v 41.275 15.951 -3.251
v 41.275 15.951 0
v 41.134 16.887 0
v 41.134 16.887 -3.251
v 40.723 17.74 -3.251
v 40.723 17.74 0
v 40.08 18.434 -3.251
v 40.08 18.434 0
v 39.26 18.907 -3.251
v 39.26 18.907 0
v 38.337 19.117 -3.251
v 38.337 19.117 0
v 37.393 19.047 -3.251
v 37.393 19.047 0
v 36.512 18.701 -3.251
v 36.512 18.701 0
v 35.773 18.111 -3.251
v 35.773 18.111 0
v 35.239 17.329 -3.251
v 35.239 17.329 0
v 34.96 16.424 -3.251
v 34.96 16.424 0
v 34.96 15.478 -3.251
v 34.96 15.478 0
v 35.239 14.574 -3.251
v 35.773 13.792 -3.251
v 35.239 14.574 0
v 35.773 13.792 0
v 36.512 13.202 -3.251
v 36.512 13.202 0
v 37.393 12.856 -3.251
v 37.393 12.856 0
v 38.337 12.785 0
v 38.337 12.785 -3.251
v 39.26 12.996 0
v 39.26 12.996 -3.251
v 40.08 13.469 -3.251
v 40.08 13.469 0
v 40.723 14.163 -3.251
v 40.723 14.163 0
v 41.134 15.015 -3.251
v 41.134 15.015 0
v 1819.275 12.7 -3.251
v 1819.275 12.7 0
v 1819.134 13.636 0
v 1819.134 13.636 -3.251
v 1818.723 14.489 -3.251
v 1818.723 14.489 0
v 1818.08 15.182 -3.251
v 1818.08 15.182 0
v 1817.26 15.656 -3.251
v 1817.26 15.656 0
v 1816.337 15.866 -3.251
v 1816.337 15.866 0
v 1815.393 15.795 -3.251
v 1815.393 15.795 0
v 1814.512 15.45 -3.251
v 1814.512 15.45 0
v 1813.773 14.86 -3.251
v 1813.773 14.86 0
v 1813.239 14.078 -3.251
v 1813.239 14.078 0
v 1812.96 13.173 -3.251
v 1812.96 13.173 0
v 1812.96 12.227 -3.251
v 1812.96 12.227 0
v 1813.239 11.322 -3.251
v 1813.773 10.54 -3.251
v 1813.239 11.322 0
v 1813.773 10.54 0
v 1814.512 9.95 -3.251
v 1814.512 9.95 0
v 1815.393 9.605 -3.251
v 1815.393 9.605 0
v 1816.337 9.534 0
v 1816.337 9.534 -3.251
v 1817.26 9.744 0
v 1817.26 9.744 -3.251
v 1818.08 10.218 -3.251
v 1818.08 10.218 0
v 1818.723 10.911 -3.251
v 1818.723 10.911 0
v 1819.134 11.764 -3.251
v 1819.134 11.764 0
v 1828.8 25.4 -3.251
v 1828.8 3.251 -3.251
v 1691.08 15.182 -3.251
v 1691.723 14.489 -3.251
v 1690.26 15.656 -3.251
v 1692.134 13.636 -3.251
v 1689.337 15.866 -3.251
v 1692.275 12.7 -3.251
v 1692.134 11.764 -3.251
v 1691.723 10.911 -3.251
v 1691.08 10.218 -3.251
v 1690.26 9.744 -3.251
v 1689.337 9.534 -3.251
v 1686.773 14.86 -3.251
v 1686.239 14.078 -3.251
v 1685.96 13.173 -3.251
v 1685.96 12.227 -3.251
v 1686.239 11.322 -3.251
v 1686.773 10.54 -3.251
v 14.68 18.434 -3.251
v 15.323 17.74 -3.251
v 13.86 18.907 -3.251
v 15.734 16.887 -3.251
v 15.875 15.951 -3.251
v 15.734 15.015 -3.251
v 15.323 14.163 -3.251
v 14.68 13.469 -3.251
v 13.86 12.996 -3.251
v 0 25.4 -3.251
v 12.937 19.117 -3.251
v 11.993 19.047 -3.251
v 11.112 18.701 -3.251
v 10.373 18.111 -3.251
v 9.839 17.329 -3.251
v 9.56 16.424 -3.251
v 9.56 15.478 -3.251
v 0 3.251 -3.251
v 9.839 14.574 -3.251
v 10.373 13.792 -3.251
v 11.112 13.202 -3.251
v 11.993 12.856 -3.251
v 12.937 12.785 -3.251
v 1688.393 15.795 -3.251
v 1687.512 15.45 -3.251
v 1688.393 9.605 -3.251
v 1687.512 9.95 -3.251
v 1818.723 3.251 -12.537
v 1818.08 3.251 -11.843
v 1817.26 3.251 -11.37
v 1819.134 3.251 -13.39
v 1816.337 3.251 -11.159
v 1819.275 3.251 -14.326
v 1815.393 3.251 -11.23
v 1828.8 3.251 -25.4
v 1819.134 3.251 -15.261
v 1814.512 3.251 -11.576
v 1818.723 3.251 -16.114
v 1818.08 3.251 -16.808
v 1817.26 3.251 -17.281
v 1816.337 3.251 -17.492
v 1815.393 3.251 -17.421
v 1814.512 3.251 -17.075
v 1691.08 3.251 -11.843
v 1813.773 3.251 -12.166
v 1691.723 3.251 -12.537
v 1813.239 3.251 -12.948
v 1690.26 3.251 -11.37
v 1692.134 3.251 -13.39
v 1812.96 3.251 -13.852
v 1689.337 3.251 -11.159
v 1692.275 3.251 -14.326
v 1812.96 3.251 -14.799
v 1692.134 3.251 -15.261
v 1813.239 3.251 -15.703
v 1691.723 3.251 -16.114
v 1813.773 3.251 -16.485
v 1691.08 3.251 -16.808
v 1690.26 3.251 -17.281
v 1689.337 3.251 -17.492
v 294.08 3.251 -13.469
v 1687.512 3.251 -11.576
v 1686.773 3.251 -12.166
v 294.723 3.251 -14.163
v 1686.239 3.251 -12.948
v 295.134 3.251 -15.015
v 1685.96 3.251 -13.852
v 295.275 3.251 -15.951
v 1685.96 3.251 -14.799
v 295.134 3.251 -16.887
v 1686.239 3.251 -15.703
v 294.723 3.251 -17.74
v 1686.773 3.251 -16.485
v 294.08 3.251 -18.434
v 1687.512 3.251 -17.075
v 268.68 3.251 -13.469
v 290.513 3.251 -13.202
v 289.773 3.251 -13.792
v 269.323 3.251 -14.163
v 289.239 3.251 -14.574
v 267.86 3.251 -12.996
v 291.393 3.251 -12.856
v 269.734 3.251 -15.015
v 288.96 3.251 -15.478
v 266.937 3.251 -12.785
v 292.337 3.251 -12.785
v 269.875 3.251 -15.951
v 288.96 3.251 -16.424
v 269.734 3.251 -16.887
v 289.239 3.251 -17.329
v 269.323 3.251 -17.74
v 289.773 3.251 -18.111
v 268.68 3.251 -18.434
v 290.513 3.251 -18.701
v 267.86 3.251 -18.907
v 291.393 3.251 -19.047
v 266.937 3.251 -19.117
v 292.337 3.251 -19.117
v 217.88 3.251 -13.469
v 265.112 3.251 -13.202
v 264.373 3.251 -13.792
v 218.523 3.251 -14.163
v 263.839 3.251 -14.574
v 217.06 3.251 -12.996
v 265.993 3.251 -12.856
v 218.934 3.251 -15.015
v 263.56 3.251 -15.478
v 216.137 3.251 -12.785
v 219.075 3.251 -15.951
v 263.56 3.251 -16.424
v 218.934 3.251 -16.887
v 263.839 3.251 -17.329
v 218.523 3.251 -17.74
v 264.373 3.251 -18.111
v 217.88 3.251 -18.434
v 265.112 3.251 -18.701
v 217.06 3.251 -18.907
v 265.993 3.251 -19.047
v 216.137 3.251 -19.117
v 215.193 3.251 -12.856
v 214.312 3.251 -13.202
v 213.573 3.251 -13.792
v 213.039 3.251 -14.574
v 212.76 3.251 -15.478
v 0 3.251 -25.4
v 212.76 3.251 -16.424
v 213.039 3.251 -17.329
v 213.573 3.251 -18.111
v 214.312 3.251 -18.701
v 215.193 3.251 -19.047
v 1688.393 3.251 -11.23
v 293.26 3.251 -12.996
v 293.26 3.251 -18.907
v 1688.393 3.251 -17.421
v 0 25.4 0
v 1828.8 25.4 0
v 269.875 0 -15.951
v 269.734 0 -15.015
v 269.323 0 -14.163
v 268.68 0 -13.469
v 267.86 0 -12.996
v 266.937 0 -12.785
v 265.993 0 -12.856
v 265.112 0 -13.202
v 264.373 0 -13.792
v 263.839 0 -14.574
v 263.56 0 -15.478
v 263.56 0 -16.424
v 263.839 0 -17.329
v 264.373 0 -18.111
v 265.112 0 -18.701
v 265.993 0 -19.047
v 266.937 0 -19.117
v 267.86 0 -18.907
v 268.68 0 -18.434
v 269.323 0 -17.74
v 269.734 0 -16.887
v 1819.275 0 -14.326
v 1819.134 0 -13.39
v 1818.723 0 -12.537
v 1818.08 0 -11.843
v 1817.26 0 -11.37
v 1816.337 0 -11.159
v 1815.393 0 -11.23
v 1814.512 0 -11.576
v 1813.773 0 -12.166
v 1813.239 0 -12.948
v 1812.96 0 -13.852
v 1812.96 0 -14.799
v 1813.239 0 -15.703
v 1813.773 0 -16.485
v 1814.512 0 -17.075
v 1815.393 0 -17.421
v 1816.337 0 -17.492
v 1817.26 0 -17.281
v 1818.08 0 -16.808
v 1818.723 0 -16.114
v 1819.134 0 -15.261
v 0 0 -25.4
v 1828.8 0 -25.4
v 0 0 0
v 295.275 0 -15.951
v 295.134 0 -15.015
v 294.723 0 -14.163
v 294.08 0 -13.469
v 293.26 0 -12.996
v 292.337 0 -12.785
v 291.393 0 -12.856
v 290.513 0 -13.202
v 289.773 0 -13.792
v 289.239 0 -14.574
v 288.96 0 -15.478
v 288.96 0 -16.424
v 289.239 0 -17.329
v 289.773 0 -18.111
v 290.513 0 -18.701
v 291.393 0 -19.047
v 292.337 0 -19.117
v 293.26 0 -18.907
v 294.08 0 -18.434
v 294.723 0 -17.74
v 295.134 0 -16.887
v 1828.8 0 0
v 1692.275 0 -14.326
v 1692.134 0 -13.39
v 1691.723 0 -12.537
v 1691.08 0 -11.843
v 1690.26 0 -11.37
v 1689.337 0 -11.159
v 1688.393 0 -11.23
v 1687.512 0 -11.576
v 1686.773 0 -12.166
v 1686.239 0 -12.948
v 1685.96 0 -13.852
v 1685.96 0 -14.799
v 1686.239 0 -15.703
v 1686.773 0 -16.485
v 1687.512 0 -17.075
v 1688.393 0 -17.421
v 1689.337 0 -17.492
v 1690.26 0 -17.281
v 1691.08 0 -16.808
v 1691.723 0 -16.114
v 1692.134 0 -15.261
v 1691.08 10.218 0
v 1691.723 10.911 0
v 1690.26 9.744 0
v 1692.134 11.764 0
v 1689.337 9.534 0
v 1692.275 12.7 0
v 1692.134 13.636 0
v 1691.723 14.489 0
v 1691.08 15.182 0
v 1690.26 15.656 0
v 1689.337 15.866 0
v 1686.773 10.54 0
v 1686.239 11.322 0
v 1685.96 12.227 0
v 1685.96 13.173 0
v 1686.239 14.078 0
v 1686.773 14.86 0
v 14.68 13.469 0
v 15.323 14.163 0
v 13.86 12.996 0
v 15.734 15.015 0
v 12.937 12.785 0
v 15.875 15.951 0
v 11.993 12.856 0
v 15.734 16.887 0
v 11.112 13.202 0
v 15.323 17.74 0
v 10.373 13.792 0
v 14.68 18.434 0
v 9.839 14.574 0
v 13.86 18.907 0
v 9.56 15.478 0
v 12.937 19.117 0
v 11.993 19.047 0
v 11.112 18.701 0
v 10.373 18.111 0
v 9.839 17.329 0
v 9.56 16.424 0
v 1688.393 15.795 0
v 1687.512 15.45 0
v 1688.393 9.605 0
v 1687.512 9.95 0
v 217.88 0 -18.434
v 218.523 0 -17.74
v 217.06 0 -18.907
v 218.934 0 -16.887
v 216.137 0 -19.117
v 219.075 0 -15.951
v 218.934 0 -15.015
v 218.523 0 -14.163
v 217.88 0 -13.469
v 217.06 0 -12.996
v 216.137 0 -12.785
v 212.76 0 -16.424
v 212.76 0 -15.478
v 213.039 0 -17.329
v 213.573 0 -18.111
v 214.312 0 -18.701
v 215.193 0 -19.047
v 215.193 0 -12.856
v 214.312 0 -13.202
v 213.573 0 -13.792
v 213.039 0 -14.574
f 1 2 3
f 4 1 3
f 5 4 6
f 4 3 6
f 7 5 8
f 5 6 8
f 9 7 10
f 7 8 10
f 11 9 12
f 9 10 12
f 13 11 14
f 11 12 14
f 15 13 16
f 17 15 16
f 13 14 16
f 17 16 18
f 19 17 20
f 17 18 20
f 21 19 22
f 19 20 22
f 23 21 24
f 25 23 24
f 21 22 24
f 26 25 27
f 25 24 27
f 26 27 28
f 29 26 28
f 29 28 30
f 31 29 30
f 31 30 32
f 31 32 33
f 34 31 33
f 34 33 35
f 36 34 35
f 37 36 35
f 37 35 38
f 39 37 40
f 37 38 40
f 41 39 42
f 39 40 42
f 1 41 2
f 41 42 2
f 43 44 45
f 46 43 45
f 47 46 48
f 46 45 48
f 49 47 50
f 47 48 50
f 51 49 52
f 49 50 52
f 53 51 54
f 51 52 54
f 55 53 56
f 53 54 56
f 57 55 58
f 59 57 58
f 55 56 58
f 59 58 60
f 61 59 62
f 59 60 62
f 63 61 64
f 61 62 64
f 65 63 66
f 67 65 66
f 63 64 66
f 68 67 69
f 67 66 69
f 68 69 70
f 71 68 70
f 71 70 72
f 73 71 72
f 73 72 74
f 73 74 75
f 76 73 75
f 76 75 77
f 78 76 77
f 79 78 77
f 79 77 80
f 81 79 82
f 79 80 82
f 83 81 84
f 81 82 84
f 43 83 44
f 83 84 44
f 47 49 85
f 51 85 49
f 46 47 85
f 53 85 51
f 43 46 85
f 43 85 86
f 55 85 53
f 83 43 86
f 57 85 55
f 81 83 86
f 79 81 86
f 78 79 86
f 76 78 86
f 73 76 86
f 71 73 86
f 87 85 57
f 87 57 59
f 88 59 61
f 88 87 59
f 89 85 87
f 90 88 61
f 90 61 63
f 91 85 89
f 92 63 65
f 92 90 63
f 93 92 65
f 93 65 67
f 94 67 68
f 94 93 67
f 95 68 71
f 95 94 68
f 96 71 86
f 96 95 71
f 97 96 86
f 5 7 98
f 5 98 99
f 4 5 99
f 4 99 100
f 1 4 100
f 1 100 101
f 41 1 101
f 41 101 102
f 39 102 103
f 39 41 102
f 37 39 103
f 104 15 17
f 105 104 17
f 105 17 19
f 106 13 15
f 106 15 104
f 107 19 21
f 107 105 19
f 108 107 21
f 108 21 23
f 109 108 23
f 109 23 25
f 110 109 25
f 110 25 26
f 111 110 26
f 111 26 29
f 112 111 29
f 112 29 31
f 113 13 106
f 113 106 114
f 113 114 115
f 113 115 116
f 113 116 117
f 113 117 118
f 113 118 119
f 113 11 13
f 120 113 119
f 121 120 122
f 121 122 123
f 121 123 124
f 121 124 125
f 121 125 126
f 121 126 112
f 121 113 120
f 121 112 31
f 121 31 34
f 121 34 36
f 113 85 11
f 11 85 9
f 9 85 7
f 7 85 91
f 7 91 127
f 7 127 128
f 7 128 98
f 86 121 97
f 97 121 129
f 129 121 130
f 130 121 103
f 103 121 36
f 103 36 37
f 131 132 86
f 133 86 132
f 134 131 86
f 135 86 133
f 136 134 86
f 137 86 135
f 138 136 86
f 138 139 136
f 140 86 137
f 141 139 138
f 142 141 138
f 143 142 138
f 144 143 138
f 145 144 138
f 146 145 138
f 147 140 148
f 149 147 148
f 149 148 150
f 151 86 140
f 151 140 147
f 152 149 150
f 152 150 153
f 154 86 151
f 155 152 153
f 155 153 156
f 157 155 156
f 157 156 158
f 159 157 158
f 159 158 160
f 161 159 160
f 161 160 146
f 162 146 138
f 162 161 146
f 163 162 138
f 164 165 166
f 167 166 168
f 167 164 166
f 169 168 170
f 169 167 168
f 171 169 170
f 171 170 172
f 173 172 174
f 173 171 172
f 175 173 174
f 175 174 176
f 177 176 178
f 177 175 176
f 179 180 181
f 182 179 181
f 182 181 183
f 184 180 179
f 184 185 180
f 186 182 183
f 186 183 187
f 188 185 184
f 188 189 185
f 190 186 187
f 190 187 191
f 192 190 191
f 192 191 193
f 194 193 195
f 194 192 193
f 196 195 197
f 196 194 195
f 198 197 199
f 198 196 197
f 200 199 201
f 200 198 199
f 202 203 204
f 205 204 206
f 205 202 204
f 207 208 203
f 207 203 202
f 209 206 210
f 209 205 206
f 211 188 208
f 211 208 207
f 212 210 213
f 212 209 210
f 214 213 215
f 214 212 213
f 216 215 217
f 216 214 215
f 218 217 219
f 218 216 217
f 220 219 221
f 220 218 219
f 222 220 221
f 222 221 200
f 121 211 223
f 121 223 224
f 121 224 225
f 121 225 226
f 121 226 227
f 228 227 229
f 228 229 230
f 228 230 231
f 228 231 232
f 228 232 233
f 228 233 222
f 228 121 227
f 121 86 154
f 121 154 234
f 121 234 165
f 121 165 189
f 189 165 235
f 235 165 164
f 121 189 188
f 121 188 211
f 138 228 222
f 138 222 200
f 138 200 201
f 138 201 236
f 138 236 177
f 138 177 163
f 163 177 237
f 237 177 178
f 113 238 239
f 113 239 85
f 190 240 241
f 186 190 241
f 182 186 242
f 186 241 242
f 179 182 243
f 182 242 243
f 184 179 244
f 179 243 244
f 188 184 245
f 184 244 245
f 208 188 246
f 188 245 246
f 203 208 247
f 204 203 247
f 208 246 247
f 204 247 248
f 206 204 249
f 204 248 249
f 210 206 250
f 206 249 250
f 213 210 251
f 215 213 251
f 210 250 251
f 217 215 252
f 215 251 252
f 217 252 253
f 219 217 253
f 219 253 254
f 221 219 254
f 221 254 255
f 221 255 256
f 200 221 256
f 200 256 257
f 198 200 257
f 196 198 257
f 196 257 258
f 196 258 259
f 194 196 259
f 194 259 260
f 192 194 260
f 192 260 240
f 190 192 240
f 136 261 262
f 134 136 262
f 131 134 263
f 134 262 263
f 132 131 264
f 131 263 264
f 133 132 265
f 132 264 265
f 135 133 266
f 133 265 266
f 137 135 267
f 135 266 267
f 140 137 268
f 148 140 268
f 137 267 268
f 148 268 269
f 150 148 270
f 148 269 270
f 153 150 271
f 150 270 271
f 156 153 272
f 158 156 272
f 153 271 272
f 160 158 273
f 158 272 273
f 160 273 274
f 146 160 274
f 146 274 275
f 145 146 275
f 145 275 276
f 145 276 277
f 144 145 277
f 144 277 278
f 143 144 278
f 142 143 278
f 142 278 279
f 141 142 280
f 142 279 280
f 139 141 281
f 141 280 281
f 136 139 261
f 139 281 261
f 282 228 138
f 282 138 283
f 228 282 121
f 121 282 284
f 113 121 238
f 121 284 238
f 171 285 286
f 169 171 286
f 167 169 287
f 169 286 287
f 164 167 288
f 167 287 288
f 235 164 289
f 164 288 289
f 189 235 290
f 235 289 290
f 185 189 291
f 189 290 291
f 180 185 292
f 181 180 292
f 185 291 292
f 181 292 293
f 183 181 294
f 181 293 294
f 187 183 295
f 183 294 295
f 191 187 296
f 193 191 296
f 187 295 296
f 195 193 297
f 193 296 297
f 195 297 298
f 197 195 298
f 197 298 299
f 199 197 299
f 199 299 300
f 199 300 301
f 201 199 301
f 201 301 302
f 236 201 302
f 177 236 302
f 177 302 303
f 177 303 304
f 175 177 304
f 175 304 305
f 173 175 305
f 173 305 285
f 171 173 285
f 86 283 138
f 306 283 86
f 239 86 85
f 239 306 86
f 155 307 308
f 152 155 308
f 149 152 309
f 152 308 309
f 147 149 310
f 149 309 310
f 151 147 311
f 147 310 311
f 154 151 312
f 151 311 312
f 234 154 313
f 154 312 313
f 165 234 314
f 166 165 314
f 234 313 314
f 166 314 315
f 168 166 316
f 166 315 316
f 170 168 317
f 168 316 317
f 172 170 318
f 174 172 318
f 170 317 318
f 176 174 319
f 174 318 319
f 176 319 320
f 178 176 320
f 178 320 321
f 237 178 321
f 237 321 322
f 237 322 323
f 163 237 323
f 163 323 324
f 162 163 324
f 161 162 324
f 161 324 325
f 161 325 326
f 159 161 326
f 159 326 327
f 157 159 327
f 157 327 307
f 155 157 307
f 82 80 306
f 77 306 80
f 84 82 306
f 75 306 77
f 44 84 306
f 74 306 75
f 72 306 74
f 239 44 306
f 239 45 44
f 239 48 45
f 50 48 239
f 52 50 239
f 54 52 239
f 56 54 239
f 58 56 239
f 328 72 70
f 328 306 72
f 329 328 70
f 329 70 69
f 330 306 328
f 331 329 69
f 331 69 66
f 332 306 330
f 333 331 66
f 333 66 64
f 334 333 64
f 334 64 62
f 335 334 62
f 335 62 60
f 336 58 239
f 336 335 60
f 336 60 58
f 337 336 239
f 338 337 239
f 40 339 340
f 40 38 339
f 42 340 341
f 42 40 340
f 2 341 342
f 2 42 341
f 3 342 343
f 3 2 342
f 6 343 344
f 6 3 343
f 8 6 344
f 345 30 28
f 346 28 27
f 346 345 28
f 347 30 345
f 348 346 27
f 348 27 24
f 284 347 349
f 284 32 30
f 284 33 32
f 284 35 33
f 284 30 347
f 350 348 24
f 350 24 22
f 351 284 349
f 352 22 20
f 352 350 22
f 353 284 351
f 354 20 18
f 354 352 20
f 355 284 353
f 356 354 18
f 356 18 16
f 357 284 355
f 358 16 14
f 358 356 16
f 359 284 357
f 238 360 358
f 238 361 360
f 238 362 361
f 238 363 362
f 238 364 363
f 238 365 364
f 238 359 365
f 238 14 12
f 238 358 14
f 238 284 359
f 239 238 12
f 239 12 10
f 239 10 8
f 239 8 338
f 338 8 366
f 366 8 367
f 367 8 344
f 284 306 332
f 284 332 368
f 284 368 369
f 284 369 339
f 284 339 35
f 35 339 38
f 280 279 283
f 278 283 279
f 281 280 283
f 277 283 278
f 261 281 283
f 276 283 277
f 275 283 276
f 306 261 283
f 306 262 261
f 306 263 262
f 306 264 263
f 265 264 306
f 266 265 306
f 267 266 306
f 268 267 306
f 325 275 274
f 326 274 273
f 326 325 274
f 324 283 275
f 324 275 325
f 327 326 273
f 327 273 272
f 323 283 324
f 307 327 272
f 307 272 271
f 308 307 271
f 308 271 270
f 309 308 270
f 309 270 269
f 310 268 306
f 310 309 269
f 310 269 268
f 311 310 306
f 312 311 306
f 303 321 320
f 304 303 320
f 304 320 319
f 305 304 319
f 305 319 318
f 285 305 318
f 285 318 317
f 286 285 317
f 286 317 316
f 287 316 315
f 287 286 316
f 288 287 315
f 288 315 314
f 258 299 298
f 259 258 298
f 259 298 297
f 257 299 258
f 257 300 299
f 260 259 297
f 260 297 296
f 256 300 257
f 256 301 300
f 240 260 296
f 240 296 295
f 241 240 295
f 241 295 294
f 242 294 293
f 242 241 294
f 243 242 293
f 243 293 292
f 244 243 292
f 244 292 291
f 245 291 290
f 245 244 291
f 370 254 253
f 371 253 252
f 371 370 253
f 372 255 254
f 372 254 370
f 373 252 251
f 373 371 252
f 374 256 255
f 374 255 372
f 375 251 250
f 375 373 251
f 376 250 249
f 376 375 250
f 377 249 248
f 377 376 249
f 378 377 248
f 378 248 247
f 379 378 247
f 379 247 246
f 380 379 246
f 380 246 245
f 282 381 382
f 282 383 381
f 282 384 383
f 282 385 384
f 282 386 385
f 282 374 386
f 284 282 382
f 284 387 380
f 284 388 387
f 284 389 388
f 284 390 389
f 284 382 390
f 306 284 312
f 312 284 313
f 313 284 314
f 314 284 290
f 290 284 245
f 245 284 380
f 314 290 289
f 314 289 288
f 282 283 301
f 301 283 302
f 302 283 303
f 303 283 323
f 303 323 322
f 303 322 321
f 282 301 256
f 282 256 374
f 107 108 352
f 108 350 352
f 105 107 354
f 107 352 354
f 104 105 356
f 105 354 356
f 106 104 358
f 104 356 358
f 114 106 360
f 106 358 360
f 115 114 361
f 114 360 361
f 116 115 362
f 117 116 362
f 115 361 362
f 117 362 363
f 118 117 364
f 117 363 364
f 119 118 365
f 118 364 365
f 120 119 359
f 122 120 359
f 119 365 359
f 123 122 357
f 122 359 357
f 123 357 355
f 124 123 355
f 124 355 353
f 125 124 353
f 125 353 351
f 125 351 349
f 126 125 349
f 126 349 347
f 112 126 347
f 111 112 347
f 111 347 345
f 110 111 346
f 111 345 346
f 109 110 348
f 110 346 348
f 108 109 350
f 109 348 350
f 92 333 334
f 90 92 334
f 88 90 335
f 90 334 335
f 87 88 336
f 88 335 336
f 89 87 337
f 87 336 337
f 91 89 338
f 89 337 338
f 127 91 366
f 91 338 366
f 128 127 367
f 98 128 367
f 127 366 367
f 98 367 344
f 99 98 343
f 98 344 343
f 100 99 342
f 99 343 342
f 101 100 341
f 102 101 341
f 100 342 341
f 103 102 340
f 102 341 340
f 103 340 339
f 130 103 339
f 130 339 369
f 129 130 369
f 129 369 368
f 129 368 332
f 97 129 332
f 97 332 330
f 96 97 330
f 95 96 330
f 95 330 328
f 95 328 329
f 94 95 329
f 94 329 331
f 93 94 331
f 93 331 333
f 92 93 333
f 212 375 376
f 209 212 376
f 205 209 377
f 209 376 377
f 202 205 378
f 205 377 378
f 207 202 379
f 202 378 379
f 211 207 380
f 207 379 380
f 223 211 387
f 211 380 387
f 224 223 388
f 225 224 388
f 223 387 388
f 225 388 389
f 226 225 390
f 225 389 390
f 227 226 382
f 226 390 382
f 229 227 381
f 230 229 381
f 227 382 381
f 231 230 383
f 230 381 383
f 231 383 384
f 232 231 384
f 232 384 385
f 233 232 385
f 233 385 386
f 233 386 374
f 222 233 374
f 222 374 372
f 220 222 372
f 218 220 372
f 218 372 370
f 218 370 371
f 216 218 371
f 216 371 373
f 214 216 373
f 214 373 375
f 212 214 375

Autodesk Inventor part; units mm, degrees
ref_plane "YZ Plane" through (0, 0, 0) normal (1, 0, 0) x (0, 1, 0)
ref_plane "XZ Plane" through (0, 0, 0) normal (0, 1, 0) x (-1, 0, 0)
ref_plane "XY Plane" through (0, 0, 0) normal (0, 0, 1) x (1, 0, 0)
sketch "Sketch1" plane through (0, 0, 0) normal (1, 0, 0) x (0, 1, 0)
  line L0 (0, 0) -> (25.4, 0)
  line L1 (25.4, 0) -> (25.4, -3.2512)
  line L2 (3.2512, -25.4) -> (0, -25.4)
  line L3 (0, -25.4) -> (0, 0)
  line L4 (25.4, -3.2512) -> (3.2512, -3.2512)
  line L5 (3.2512, -3.2512) -> (3.2512, -25.4)
  dimension "d2" = 3.2512
  dimension "d3" = 3.2512
  dimension "d4" = 25.4
extrude "Extrusion1" add sketch "Sketch1" along normal blind 1828.8
sketch "Sketch2" plane through (0, 0, 0) normal (0, 0, 1) x (1, 0, 0)
  line L0 (0, 0) -> (0, 25.4) projected
  line L1 (2.7844, 15.9512) -> (73.6304, 15.9512) construction
  circle A0 centre (12.7, 15.9512) radius 3.175
  circle A1 centre (38.1, 15.9512) radius 3.175
  line L2 (0, 25.4) -> (1828.8, 25.4) projected
  line L3 (0, 0) -> (1828.8, 0) projected
  dimension "d7" = 6.35
  dimension "d8" = 12.7
  dimension "d9" = 38.1
  dimension "d20" = 15.9512
extrude "Extrusion2" cut sketch "Sketch2" against normal blind 1828.8
sketch "Sketch3" plane through (0, 0, -25.4) normal (0, -1, 0) x (1, 0, 0)
  line L0 (1.3644, 9.4488) -> (86.9618, 9.4488) construction
  circle A0 centre (266.7, 9.4488) radius 3.175
  circle A1 centre (292.1, 9.4488) radius 3.175
  line L1 (0, 25.4) -> (1828.8, 25.4) projected
  line L2 (0, 0) -> (0, 25.4) projected
  circle A2 centre (215.9, 9.4488) radius 3.175
  dimension "d12" = 6.35
  dimension "d17" = 15.9512
  dimension "d18" = 266.7
  dimension "d19" = 292.1
  dimension "d31" = 215.9
extrude "Extrusion3" cut sketch "Sketch3" against normal blind 1828.8
sketch "Sketch4" plane through (0, 0, 0) normal (0, 0, 1) x (1, 0, 0)
  line L0 (1828.8, 25.4) -> (1828.8, 0) projected
  line L1 (1828.8, 12.7) -> (1190.8061, 12.7) construction
  circle A0 centre (1816.1, 12.7) radius 3.175
  circle A1 centre (1689.1, 12.7) radius 3.175
  point P0 (0, 0)
  dimension "d21" = 6.35
  dimension "d22" = 12.7
  dimension "d23" = 139.7
extrude "Extrusion4" cut sketch "Sketch4" against normal blind 1828.8
sketch "Sketch5" plane through (0, 0, -25.4) normal (0, -1, 0) x (1, 0, 0)
  line L0 (1828.8, 0) -> (1828.8, 22.1488) projected
  line L1 (1828.8, 11.0744) -> (1744.1467, 11.0744) construction
  circle A0 centre (1689.1, 11.0744) radius 3.175
  circle A1 centre (1816.1, 11.0744) radius 3.175
  point P0 (0, 25.4)
  dimension "d26" = 6.35
  dimension "d27" = 12.7
  dimension "d28" = 139.7
extrude "Extrusion5" cut sketch "Sketch5" against normal blind 1828.8
properties part number "Lower Long L"
